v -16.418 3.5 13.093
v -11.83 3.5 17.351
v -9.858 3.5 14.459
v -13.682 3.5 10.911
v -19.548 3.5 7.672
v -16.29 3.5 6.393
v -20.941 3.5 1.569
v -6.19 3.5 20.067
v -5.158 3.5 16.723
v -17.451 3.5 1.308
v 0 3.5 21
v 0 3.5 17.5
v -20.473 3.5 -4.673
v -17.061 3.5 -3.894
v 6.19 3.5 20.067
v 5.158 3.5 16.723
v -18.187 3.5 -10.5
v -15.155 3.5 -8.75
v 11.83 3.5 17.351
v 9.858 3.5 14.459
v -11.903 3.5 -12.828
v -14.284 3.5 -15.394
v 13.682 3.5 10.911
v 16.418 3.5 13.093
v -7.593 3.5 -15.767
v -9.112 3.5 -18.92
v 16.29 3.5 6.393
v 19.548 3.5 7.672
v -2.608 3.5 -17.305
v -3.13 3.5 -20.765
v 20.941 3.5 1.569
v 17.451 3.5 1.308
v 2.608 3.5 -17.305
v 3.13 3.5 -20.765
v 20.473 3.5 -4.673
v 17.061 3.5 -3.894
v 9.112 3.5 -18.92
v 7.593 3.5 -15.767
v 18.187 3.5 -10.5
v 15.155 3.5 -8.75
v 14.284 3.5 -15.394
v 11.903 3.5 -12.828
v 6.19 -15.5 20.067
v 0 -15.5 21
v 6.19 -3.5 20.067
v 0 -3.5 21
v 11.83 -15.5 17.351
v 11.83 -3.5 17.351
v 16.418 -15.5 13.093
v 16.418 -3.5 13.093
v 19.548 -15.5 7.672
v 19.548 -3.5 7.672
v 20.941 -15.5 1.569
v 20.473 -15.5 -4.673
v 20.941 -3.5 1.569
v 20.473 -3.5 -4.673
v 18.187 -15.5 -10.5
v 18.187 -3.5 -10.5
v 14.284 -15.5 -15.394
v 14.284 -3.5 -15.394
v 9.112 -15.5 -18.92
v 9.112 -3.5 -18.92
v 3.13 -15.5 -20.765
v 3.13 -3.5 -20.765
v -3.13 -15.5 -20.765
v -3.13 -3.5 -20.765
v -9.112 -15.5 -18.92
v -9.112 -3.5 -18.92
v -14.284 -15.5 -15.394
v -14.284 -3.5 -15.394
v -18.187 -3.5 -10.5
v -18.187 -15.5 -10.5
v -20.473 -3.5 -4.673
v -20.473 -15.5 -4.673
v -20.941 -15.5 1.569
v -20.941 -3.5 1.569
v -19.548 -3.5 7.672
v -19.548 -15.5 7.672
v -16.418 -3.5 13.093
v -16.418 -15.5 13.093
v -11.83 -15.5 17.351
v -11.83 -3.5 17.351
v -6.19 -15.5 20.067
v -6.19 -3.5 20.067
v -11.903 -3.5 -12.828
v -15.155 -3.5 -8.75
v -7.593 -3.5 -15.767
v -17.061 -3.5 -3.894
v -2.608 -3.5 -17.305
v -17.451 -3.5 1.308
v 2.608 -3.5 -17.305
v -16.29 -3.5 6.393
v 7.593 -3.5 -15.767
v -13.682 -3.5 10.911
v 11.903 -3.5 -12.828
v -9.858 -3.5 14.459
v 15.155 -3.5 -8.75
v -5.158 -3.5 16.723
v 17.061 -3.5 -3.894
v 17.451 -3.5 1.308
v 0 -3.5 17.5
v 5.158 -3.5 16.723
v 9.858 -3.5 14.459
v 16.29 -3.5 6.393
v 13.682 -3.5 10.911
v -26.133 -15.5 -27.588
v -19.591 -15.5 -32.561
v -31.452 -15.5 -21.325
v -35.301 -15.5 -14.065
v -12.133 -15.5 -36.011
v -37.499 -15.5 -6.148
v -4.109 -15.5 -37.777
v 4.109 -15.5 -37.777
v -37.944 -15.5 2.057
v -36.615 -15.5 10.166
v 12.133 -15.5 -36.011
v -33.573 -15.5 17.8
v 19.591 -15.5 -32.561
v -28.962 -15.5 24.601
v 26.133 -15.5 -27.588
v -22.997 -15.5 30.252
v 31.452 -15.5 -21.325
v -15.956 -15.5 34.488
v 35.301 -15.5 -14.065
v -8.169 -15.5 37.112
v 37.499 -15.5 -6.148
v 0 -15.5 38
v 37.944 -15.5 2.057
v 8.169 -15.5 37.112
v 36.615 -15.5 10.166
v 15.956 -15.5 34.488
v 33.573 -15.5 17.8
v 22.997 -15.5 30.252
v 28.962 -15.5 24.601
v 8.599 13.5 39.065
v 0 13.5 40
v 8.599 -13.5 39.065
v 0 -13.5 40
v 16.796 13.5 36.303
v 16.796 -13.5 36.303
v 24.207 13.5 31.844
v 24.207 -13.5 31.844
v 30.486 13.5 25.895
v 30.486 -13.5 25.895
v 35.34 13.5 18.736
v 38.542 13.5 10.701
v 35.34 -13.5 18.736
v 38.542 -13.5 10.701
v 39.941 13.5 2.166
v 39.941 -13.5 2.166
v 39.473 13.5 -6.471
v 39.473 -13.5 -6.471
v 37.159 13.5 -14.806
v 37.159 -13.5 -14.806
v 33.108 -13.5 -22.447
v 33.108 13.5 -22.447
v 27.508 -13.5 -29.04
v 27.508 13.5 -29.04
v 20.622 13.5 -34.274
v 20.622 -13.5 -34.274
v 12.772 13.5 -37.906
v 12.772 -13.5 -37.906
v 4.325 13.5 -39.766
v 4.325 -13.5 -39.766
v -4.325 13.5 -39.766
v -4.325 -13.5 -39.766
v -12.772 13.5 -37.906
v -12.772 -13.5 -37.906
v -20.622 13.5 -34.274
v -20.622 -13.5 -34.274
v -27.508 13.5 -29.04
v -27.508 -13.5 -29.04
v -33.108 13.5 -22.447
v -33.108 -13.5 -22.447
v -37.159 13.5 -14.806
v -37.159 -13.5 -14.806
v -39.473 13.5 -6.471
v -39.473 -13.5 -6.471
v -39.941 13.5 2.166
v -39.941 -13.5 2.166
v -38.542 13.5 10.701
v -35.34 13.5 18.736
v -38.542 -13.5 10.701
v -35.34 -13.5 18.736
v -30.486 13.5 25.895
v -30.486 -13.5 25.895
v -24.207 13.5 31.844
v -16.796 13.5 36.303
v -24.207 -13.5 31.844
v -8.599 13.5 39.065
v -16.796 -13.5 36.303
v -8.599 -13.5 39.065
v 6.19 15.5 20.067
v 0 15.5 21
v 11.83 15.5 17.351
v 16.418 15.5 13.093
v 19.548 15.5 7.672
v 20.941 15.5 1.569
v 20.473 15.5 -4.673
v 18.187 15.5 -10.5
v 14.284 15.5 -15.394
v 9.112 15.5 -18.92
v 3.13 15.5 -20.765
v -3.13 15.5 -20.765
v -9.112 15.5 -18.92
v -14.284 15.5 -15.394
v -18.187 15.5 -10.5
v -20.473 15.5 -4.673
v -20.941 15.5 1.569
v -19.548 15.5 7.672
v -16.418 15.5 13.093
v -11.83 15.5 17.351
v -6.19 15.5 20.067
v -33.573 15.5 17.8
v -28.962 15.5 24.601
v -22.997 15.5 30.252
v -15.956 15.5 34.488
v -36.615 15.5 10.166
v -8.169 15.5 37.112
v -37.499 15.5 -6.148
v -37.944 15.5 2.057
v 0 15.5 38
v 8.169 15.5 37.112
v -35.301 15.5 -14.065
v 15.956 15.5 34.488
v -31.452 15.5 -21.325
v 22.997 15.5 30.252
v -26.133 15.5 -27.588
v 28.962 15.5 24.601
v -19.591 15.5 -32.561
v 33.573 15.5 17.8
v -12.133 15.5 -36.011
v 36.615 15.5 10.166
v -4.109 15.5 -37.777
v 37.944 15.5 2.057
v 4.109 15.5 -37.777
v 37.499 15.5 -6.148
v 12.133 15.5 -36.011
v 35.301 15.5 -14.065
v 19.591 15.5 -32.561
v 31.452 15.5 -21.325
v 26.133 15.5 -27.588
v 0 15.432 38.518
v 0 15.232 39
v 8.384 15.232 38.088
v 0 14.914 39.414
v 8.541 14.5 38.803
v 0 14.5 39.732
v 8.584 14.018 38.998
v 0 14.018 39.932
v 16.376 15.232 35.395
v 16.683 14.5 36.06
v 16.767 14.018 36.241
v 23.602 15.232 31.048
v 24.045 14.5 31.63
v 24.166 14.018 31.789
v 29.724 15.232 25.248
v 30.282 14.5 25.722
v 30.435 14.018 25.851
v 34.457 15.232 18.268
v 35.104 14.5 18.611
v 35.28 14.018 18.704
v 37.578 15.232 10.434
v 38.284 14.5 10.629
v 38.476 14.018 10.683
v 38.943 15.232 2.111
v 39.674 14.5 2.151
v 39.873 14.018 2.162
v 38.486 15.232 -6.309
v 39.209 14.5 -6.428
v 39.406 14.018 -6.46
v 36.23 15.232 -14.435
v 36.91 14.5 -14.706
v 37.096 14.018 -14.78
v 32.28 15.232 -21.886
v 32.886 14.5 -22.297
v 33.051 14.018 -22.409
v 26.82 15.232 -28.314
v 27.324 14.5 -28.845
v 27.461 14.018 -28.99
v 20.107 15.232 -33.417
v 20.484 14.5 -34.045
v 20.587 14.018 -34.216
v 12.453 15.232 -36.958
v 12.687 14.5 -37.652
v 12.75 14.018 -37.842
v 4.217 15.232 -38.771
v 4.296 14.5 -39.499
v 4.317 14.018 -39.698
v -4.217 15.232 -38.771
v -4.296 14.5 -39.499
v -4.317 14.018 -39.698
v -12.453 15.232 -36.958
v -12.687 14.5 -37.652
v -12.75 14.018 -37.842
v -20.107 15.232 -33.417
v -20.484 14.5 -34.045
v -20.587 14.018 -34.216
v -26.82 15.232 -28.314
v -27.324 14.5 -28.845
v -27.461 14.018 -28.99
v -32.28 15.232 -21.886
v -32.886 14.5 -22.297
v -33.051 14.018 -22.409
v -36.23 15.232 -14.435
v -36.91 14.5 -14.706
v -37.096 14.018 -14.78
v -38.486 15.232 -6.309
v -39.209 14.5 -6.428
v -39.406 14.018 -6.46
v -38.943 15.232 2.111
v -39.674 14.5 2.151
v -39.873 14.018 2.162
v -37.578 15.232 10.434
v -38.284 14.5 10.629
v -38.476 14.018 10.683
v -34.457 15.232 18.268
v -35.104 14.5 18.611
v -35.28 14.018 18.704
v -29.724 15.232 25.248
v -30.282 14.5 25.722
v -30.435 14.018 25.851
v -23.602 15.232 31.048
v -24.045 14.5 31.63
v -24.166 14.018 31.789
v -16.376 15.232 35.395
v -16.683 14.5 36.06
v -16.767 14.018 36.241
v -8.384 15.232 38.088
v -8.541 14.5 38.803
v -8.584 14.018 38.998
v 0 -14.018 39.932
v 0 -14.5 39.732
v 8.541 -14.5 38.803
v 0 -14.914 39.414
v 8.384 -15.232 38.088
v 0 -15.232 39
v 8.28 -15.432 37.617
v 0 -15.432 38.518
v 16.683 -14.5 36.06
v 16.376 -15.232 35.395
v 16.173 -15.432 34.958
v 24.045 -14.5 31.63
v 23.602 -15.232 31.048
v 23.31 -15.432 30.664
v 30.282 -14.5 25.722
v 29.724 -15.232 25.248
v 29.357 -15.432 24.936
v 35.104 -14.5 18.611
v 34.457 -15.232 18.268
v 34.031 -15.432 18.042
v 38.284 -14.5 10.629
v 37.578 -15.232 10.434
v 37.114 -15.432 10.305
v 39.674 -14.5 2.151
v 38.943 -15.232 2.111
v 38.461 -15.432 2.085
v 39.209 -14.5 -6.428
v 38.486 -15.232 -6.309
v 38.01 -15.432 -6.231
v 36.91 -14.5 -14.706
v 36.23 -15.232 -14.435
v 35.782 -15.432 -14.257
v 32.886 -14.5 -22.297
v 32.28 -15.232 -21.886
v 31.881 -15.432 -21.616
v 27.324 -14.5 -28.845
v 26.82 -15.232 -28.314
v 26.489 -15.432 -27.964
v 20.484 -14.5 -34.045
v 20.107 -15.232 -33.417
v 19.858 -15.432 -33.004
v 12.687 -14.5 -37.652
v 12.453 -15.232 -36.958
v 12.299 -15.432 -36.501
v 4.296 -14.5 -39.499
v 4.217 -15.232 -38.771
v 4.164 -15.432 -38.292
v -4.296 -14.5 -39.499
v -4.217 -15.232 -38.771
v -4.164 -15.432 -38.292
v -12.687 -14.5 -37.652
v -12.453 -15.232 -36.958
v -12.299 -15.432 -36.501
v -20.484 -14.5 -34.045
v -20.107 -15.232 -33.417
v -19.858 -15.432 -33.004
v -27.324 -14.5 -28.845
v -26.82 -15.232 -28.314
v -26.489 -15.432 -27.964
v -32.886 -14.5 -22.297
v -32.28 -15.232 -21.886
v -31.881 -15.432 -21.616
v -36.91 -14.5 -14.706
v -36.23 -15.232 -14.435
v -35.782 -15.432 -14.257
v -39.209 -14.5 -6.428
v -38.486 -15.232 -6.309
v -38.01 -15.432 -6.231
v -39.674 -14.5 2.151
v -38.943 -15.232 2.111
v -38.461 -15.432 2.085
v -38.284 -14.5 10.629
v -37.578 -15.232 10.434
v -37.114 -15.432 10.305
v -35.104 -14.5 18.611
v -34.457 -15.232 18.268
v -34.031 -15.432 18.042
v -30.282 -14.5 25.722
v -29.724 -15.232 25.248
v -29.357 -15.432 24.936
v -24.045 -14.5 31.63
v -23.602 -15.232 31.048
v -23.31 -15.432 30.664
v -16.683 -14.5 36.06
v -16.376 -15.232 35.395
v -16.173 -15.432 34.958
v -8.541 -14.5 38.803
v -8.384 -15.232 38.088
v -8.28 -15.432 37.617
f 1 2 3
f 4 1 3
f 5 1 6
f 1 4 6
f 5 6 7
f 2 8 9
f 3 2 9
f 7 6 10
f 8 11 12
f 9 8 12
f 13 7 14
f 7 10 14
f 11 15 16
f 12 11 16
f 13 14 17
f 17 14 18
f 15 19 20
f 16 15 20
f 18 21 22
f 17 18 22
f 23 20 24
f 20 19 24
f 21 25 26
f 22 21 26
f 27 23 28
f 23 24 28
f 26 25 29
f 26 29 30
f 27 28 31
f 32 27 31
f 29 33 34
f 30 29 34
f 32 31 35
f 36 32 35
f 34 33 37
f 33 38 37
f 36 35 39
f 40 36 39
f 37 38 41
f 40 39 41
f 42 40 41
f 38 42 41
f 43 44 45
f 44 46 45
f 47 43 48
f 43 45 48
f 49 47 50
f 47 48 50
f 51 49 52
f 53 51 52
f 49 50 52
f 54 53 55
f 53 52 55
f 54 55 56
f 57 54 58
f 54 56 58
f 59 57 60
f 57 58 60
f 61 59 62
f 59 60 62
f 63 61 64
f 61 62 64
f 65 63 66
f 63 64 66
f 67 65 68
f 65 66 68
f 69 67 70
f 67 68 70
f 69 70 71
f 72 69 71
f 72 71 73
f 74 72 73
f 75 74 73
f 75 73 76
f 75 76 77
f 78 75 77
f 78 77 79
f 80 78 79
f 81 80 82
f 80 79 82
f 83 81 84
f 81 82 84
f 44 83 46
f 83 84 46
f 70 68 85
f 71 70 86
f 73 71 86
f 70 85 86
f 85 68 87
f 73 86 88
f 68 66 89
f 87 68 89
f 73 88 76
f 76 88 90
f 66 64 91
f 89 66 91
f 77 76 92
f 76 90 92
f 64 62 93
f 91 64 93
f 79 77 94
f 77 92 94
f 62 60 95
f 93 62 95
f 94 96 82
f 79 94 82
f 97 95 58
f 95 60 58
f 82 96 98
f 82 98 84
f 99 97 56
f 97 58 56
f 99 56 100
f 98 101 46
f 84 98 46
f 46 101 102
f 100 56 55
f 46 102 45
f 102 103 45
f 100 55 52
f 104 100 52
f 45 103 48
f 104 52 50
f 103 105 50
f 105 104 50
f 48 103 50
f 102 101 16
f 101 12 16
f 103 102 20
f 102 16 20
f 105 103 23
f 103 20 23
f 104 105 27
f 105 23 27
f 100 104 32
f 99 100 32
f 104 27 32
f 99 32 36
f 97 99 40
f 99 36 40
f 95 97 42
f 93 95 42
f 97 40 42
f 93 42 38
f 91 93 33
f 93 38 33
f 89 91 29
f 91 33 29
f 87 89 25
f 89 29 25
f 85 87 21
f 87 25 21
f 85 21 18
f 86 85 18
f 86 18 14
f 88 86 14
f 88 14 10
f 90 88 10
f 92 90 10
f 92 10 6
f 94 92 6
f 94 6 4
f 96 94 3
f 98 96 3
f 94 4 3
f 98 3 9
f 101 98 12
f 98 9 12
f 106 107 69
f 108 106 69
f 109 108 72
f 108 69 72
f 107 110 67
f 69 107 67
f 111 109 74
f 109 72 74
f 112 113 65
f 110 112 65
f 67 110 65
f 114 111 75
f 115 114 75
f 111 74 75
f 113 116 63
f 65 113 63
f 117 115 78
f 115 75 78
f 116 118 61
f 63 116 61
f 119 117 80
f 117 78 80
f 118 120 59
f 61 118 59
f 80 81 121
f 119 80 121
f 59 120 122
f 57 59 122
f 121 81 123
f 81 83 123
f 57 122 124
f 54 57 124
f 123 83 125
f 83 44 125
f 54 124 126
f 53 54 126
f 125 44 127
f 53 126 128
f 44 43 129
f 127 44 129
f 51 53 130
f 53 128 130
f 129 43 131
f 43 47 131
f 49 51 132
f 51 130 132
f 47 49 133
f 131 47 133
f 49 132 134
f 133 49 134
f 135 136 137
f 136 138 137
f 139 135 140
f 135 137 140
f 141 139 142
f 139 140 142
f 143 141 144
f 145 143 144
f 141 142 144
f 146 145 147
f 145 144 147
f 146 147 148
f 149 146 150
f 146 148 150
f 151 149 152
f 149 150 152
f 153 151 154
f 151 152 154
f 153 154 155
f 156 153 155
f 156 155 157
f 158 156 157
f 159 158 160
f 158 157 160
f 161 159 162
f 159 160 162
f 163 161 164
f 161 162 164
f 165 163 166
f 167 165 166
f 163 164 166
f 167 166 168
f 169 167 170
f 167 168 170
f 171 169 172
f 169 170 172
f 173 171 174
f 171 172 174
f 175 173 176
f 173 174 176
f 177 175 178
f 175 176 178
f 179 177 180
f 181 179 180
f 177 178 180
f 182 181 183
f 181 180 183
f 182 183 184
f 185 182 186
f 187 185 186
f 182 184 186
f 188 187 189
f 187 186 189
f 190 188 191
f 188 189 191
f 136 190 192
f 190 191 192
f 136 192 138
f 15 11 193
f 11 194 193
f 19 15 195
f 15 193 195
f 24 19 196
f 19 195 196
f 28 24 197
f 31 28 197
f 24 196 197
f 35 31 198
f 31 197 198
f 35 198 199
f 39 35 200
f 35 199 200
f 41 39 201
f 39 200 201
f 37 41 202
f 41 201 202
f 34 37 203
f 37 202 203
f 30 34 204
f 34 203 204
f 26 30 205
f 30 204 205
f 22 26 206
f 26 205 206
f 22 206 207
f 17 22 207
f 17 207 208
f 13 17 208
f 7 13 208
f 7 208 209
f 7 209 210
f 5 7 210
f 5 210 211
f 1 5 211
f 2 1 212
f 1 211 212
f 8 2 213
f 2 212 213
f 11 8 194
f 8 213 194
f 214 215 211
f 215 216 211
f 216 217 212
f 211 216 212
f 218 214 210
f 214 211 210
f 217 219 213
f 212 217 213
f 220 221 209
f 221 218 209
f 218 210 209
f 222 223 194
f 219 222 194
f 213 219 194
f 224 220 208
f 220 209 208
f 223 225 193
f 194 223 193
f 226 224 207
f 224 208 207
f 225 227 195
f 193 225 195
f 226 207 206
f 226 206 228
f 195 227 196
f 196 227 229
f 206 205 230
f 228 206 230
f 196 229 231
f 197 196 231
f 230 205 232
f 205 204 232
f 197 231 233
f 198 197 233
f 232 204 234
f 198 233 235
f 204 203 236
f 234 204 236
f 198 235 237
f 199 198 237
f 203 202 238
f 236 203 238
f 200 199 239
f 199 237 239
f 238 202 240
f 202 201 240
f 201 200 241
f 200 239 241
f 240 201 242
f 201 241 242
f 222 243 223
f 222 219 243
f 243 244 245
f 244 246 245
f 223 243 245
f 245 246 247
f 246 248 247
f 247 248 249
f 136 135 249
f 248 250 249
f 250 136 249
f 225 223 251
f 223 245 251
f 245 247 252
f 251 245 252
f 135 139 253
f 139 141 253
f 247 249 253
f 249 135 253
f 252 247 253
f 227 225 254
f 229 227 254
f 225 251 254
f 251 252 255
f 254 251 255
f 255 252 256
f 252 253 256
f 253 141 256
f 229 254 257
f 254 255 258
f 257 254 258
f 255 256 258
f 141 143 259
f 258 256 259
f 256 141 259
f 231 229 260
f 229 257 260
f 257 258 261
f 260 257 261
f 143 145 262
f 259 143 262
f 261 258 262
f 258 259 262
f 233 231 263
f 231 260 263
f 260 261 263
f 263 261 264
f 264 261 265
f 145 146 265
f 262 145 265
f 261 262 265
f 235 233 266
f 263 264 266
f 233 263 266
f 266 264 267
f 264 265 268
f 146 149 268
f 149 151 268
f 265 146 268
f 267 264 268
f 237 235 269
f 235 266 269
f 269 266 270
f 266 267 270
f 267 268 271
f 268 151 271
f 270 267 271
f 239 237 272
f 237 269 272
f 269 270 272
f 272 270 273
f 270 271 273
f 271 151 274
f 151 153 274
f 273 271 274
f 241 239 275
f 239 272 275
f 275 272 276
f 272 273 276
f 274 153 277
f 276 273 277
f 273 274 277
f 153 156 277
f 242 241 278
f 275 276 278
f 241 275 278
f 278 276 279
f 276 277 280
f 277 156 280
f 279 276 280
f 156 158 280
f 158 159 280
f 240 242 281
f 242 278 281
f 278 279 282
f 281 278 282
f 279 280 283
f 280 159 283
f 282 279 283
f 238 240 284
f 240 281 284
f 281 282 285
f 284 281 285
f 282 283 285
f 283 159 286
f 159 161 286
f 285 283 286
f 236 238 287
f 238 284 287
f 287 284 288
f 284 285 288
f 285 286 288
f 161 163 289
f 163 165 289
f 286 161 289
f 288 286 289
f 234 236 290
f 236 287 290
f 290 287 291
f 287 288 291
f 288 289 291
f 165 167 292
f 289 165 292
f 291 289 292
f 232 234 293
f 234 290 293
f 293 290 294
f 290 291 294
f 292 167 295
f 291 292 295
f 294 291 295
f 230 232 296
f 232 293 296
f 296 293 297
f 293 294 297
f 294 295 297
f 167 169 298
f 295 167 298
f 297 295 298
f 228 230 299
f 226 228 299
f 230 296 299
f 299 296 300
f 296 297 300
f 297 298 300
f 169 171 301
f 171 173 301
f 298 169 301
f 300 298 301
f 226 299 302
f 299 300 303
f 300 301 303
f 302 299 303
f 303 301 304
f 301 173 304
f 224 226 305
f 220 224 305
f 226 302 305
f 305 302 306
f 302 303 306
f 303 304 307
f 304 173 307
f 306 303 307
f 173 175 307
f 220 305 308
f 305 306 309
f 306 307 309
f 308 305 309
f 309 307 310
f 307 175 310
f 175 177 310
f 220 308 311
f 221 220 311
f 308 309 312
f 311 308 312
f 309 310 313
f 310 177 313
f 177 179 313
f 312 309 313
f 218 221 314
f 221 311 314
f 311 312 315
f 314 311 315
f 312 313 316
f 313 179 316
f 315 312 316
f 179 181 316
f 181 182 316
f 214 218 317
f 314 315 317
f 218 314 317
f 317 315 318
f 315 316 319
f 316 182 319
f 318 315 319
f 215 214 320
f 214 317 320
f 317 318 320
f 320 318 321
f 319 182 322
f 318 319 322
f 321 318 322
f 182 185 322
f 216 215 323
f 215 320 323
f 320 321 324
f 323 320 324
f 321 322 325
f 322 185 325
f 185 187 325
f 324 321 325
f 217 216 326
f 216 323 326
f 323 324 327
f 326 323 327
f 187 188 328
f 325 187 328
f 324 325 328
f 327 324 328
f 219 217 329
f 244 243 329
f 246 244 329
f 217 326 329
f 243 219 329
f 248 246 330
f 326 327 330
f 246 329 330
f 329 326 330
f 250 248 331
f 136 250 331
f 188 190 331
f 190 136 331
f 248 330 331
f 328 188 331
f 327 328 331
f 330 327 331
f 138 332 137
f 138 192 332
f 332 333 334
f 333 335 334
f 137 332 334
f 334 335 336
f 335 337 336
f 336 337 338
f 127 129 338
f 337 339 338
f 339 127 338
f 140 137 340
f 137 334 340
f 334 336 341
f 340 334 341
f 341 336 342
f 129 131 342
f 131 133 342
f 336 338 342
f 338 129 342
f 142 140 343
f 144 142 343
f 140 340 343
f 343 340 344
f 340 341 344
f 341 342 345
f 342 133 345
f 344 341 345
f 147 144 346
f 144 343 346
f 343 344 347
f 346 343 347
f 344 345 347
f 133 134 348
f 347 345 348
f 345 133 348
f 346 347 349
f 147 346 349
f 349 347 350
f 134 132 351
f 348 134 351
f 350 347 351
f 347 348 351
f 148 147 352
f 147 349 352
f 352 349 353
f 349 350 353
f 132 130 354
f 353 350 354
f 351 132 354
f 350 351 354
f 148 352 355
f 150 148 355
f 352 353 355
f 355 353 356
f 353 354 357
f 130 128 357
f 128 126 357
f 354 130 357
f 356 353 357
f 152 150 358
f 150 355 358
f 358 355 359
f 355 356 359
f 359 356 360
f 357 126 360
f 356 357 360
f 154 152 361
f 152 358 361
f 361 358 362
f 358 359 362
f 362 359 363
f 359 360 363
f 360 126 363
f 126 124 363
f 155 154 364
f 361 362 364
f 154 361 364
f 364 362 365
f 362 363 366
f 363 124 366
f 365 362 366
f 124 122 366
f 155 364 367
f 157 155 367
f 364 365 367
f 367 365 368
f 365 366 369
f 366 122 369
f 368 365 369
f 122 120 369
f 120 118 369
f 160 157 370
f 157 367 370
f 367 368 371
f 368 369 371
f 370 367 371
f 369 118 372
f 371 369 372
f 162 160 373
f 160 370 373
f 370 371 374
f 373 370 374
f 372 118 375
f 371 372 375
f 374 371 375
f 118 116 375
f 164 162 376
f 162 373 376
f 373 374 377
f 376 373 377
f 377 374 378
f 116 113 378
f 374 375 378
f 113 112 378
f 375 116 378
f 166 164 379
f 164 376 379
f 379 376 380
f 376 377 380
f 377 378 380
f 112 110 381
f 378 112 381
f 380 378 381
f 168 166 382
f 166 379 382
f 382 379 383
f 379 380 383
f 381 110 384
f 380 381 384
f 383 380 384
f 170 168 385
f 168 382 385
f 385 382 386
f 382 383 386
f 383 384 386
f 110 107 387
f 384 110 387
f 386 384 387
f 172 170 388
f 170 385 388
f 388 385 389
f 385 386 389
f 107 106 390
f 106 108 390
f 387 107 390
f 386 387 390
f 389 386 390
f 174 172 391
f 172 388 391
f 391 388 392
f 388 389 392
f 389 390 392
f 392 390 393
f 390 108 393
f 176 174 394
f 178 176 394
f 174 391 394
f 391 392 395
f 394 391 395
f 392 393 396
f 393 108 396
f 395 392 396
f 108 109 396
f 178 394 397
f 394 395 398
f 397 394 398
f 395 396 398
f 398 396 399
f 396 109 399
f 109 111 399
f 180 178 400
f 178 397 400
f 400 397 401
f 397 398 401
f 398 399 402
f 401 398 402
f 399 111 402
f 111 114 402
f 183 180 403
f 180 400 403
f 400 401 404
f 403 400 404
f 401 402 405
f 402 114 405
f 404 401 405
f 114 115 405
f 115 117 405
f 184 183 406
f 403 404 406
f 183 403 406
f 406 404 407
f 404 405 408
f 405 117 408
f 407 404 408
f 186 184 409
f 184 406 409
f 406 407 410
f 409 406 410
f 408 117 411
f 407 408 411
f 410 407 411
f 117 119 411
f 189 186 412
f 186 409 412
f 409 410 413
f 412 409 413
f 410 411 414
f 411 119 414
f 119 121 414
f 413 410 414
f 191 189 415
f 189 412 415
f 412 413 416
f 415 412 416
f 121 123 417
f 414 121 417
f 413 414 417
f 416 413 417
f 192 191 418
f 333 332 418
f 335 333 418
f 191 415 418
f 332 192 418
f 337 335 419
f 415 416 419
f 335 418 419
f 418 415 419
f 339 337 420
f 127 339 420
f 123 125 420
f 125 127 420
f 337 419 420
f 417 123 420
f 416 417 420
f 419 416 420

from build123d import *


with BuildPart() as f1:
    # F0 (on Right) → F1 (revolve)
    with BuildSketch(Plane.YZ):
        with BuildLine():
            Line((-15.5, 38), (-15.5, 21))
            Line((-15.5, 21), (-3.5, 21))
            Line((-3.5, 21), (-3.5, 17.5))
            Line((-3.5, 17.5), (3.5, 17.5))
            Line((3.5, 17.5), (3.5, 21))
            Line((3.5, 21), (15.5, 21))
            Line((15.5, 21), (15.5, 38))
            ThreePointArc((15.5, 38), (14.914214, 39.414214), (13.5, 40))
            Line((13.5, 40), (-13.5, 40))
            ThreePointArc((-13.5, 40), (-14.914214, 39.414214), (-15.5, 38))
        make_face()
    revolve(axis=Axis((0, 5.437174, 0), (0, 1, 0)))


solid = f1.part
